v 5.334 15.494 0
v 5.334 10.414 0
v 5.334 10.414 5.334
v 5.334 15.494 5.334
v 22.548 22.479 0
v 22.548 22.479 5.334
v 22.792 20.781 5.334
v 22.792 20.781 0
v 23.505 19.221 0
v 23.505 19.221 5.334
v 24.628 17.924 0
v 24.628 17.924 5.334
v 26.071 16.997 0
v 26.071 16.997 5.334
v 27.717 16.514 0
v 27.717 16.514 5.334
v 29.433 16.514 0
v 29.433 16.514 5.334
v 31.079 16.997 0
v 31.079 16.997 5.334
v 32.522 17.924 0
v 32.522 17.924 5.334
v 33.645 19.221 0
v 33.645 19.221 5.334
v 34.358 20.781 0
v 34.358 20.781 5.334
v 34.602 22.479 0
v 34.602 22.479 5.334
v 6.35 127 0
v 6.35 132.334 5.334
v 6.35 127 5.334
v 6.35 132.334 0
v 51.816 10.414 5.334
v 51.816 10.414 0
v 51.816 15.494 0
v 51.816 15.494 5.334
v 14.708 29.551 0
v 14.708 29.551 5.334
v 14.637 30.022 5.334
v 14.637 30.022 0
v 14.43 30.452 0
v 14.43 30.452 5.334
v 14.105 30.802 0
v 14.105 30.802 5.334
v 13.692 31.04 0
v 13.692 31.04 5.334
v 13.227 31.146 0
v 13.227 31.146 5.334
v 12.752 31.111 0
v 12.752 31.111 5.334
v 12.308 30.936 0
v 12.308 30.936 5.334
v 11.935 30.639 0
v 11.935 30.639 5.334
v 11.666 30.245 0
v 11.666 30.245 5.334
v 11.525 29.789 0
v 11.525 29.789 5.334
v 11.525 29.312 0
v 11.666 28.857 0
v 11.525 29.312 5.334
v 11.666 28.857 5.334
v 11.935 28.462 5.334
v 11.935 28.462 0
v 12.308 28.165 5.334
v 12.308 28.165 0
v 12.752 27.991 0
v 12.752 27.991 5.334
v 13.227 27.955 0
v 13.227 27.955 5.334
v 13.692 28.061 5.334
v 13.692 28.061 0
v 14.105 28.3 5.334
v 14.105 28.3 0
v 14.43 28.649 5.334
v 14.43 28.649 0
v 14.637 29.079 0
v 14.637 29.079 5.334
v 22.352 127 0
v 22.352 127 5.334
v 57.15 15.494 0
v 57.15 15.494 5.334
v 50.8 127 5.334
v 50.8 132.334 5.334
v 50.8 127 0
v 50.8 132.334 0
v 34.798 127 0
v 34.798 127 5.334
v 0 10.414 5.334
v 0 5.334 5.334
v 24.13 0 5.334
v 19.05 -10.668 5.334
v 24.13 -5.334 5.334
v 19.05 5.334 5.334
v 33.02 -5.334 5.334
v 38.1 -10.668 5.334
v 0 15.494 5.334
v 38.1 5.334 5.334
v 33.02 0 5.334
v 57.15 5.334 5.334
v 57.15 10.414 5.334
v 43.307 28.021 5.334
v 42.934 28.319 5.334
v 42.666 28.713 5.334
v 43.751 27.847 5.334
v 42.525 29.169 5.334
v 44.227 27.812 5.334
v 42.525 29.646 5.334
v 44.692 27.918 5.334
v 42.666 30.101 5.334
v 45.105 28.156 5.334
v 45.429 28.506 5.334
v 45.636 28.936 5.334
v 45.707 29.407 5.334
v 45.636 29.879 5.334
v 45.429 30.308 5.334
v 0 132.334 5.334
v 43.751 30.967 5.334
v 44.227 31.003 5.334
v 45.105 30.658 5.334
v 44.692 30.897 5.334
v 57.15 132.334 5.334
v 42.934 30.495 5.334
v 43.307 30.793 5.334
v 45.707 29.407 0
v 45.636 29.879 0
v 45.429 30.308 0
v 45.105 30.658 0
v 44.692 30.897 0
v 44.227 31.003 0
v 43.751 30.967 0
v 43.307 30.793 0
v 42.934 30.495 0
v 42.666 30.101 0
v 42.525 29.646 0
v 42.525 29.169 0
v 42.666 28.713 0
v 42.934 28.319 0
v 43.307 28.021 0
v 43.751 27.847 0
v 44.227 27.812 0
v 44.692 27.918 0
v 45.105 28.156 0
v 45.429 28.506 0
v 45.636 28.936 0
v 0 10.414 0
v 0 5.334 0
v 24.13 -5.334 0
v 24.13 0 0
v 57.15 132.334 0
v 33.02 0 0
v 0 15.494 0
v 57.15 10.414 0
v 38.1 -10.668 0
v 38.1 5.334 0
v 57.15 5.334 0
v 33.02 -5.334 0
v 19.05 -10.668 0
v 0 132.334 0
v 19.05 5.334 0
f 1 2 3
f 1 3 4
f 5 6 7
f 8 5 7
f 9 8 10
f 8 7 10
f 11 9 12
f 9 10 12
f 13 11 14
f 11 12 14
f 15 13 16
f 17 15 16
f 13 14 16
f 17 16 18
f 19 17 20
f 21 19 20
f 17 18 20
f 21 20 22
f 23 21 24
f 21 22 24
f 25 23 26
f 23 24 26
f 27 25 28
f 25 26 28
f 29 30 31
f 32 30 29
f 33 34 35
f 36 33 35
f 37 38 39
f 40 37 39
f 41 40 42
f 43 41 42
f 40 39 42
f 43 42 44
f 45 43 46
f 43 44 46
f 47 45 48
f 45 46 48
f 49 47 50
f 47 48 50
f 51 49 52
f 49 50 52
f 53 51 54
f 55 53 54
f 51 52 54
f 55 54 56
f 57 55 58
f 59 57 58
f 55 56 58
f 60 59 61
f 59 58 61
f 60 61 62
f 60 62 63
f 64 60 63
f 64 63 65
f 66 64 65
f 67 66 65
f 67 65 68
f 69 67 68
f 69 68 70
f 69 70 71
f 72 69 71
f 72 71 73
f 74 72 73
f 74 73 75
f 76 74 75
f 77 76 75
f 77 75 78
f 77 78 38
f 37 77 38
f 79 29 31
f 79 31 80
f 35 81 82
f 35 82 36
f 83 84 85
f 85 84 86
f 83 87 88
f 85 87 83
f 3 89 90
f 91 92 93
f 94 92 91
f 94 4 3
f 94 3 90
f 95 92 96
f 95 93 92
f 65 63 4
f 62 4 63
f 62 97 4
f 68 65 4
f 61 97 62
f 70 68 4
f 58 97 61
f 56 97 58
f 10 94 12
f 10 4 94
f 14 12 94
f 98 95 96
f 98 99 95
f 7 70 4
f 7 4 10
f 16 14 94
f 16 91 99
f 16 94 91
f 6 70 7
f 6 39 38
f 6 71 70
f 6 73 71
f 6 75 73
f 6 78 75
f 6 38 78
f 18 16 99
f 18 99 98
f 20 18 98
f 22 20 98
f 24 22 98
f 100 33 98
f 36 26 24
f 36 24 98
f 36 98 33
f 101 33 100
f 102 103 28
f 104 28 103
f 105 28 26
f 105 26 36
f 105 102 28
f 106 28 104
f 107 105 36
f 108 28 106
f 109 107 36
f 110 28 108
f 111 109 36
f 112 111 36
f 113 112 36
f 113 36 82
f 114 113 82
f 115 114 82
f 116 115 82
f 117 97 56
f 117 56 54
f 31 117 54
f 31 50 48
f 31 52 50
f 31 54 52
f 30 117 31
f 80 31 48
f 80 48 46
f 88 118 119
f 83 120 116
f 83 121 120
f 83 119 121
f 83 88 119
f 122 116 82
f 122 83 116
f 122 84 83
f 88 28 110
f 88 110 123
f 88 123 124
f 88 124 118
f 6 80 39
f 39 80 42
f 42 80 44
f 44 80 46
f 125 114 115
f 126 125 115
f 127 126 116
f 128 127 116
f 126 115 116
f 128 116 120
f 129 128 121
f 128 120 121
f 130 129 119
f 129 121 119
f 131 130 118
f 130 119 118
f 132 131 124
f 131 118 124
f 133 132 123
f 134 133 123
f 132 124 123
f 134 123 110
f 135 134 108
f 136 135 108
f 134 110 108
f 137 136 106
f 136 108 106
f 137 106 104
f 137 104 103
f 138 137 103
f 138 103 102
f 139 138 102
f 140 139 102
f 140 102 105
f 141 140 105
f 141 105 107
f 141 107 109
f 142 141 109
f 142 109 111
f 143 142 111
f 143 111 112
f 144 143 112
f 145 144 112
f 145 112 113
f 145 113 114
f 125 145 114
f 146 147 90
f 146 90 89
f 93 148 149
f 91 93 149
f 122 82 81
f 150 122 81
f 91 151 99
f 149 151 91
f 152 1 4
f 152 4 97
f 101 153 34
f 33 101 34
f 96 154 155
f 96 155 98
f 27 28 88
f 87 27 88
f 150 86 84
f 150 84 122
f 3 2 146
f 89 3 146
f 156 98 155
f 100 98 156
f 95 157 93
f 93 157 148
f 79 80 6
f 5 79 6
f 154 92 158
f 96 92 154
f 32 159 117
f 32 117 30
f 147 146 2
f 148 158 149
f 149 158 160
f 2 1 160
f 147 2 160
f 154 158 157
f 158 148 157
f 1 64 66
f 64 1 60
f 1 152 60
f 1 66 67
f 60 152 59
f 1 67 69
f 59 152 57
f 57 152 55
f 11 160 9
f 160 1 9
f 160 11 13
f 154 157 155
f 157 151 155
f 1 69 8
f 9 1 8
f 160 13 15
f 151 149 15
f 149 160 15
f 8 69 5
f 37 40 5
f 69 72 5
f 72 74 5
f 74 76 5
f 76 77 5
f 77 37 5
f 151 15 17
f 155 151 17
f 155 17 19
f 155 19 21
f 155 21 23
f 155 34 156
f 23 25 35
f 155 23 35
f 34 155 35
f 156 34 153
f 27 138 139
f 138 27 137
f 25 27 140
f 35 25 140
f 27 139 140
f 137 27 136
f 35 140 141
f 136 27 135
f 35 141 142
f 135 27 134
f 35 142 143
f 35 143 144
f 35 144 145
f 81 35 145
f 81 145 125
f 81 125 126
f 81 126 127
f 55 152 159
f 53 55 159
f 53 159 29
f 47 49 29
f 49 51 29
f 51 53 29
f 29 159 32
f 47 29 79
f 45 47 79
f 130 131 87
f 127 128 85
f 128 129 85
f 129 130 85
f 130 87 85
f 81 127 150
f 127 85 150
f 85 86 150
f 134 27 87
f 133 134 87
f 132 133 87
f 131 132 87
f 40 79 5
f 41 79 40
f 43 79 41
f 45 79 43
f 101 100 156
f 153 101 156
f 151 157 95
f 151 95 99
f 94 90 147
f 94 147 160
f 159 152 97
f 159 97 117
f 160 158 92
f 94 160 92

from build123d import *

# Parameters (mm, degrees)
SKETCH1_W           = 57.15
SKETCH1_H           = 127
BOSS_EXTRUDE3_DEPTH = 5.334
CUT_EXTRUDE2_DEPTH  = 140.368483008
SKETCH8_W           = 19.05
SKETCH8_H           = 5.334
CUT_EXTRUDE6_DEPTH  = 5.334
SKETCH8_5_W         = 19.05
SKETCH8_5_H         = 5.334
CUT_EXTRUDE7_DEPTH  = 5.334
SKETCH16_W          = 22.352
SKETCH16_H          = 5.334
BOSS_EXTRUDE4_DEPTH = 5.334
SKETCH32_W          = 16.002
SKETCH32_H          = 5.334
CUT_EXTRUDE13_DEPTH = 5.334
SKETCH35_R          = 1.6
CUT_EXTRUDE15_DEPTH = 145.245837417
SKETCH36_W          = 19.05
SKETCH36_H          = 5.334
BOSS_EXTRUDE5_DEPTH = 10.668
SKETCH37_W          = 8.89
SKETCH37_H          = 5.334
CUT_EXTRUDE16_DEPTH = 145.245837417
SKETCH38_W          = 5.334
SKETCH38_H          = 5.08
CUT_EXTRUDE17_DEPTH = 145.245837417


with BuildPart() as part:
    # Sketch1 → Boss-Extrude3 (new body)
    with BuildSketch(Plane.XY):
        with Locations((28.575, 63.5)):
            Rectangle(SKETCH1_W, SKETCH1_H)
    extrude(amount=BOSS_EXTRUDE3_DEPTH)

    # Sketch3 → Cut-Extrude2 (cut, through all)
    with BuildSketch(Plane.XY.offset(5.334)):
        with BuildLine():
            Line((34.798, 127), (22.352, 127))
            Line((22.352, 127), (22.548184887, 22.479))
            ThreePointArc((22.548184887, 22.479), (28.575, 16.452184887), (34.601815113, 22.479))
            Line((34.601815113, 22.479), (34.798, 127))
        make_face()
    extrude(amount=-CUT_EXTRUDE2_DEPTH, mode=Mode.SUBTRACT)

    # Sketch8 → Cut-Extrude6 (cut)
    with BuildSketch(Plane.XZ):
        with Locations((47.625, 2.667)):
            Rectangle(SKETCH8_W, SKETCH8_H)
    extrude(amount=-CUT_EXTRUDE6_DEPTH, mode=Mode.SUBTRACT)

    # Sketch8<5> → Cut-Extrude7 (cut)
    with BuildSketch(Plane.XZ):
        with Locations((47.625, 2.667)):
            Rectangle(SKETCH8_5_W, SKETCH8_5_H)
        with Locations((9.525, 2.667)):
            Rectangle(SKETCH8_5_W, SKETCH8_5_H)
    extrude(amount=-CUT_EXTRUDE7_DEPTH, mode=Mode.SUBTRACT)

    # Sketch16 → Boss-Extrude4 (add)
    with BuildSketch(Plane(origin=(0, 127, 0), x_dir=(1, 0, 0), z_dir=(0, 1, 0))):
        with Locations((45.974, -2.667)):
            Rectangle(SKETCH16_W, SKETCH16_H)
        with Locations((11.176, -2.667)):
            Rectangle(SKETCH16_W, SKETCH16_H)
    extrude(amount=BOSS_EXTRUDE4_DEPTH)

    # Sketch32 → Cut-Extrude13 (cut)
    with BuildSketch(Plane(origin=(0, 132.334, 0), x_dir=(1, 0, 0), z_dir=(0, 1, 0))):
        with Locations((14.351, -2.667)):
            Rectangle(SKETCH32_W, SKETCH32_H)
        with Locations((42.799, -2.667)):
            Rectangle(SKETCH32_W, SKETCH32_H)
    extrude(amount=-CUT_EXTRUDE13_DEPTH, mode=Mode.SUBTRACT)

    # Sketch35 → Cut-Extrude15 (cut, through all)
    with BuildSketch(Plane.XY.offset(5.334)):
        with Locations((13.107594454, 29.550730033)):
            Circle(SKETCH35_R)
        with Locations((44.107261808, 29.40711974)):
            Circle(SKETCH35_R)
    extrude(amount=-CUT_EXTRUDE15_DEPTH, mode=Mode.SUBTRACT)

    # Sketch36 → Boss-Extrude5 (add)
    with BuildSketch(Plane.XZ):
        with Locations((28.575, 2.667)):
            Rectangle(SKETCH36_W, SKETCH36_H)
    extrude(amount=BOSS_EXTRUDE5_DEPTH)

    # Sketch37 → Cut-Extrude16 (cut, through all)
    with BuildSketch(Plane(origin=(0, 0, 0), x_dir=(-1, 0, 0), z_dir=(0, 0, -1))):
        with Locations((-28.575, -2.667)):
            Rectangle(SKETCH37_W, SKETCH37_H)
    extrude(amount=-CUT_EXTRUDE16_DEPTH, mode=Mode.SUBTRACT)

    # Sketch38 → Cut-Extrude17 (cut, through all)
    with BuildSketch(Plane(origin=(0, 0, 0), x_dir=(-1, 0, 0), z_dir=(0, 0, -1))):
        with Locations((-54.483, 12.954)):
            Rectangle(SKETCH38_W, SKETCH38_H)
        with Locations((-2.667, 12.954)):
            Rectangle(SKETCH38_W, SKETCH38_H)
    extrude(amount=-CUT_EXTRUDE17_DEPTH, mode=Mode.SUBTRACT)


solid = part.part
